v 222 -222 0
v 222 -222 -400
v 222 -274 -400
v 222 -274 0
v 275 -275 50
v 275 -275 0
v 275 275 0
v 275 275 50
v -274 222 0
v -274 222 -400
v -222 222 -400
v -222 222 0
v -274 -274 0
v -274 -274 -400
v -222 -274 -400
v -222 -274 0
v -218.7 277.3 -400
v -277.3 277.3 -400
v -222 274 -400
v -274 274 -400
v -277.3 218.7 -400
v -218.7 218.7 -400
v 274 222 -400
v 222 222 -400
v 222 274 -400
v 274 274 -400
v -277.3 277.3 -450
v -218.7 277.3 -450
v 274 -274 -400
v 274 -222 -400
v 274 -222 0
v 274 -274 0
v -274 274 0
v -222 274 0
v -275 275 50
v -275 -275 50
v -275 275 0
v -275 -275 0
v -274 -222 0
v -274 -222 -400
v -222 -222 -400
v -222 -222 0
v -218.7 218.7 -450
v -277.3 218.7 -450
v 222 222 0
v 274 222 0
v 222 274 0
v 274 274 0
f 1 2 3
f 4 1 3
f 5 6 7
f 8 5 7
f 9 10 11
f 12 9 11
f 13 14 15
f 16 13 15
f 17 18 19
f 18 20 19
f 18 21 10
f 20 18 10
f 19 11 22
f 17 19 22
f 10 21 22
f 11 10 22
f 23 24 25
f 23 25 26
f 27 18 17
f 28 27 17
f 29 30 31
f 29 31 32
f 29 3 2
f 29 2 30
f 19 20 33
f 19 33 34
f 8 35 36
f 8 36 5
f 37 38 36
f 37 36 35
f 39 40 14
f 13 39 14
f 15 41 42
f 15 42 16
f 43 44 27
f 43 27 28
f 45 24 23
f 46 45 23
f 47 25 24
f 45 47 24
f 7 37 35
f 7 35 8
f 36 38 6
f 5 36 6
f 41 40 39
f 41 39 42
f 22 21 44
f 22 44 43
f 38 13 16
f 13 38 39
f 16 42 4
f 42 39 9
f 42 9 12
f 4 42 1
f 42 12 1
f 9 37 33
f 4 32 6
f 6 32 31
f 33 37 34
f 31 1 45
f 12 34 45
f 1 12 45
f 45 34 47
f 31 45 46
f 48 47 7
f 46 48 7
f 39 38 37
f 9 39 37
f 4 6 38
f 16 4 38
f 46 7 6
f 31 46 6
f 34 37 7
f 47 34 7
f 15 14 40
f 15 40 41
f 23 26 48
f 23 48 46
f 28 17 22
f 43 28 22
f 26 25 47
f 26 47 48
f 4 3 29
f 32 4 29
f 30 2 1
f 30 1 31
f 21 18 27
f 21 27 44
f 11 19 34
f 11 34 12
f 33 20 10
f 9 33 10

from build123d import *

# Parameters (mm, degrees)
F0_W     = 550
F0_H     = 550
F1_DEPTH = 50
F2_W     = 52
F2_H     = 52
F3_DEPTH = 400
F4_W     = 58.6
F4_H     = 58.6
F5_DEPTH = 50


with BuildPart() as f1:
    # F0 (on Top) → F1 (new body)
    with BuildSketch(Plane.XY):
        Rectangle(F0_W, F0_H)
    extrude(amount=F1_DEPTH)

    # F2 (on face) → F3 (join)
    with BuildSketch(Plane(origin=(0, 0, 0), x_dir=(1, 0, 0), z_dir=(0, 0, -1))):
        with Locations((-248, 248)):
            Rectangle(F2_W, F2_H)
        with Locations((248, 248)):
            Rectangle(F2_W, F2_H)
        with Locations((248, -248)):
            Rectangle(F2_W, F2_H)
        with Locations((-248, -248)):
            Rectangle(F2_W, F2_H)
    extrude(amount=F3_DEPTH)

    # F4 (on face) → F5 (join)
    with BuildSketch(Plane(origin=(0, 0, -400), x_dir=(1, 0, 0), z_dir=(0, 0, -1))):
        with Locations((-248, -248)):
            Rectangle(F4_W, F4_H)
    extrude(amount=F5_DEPTH)


solid = f1.part
